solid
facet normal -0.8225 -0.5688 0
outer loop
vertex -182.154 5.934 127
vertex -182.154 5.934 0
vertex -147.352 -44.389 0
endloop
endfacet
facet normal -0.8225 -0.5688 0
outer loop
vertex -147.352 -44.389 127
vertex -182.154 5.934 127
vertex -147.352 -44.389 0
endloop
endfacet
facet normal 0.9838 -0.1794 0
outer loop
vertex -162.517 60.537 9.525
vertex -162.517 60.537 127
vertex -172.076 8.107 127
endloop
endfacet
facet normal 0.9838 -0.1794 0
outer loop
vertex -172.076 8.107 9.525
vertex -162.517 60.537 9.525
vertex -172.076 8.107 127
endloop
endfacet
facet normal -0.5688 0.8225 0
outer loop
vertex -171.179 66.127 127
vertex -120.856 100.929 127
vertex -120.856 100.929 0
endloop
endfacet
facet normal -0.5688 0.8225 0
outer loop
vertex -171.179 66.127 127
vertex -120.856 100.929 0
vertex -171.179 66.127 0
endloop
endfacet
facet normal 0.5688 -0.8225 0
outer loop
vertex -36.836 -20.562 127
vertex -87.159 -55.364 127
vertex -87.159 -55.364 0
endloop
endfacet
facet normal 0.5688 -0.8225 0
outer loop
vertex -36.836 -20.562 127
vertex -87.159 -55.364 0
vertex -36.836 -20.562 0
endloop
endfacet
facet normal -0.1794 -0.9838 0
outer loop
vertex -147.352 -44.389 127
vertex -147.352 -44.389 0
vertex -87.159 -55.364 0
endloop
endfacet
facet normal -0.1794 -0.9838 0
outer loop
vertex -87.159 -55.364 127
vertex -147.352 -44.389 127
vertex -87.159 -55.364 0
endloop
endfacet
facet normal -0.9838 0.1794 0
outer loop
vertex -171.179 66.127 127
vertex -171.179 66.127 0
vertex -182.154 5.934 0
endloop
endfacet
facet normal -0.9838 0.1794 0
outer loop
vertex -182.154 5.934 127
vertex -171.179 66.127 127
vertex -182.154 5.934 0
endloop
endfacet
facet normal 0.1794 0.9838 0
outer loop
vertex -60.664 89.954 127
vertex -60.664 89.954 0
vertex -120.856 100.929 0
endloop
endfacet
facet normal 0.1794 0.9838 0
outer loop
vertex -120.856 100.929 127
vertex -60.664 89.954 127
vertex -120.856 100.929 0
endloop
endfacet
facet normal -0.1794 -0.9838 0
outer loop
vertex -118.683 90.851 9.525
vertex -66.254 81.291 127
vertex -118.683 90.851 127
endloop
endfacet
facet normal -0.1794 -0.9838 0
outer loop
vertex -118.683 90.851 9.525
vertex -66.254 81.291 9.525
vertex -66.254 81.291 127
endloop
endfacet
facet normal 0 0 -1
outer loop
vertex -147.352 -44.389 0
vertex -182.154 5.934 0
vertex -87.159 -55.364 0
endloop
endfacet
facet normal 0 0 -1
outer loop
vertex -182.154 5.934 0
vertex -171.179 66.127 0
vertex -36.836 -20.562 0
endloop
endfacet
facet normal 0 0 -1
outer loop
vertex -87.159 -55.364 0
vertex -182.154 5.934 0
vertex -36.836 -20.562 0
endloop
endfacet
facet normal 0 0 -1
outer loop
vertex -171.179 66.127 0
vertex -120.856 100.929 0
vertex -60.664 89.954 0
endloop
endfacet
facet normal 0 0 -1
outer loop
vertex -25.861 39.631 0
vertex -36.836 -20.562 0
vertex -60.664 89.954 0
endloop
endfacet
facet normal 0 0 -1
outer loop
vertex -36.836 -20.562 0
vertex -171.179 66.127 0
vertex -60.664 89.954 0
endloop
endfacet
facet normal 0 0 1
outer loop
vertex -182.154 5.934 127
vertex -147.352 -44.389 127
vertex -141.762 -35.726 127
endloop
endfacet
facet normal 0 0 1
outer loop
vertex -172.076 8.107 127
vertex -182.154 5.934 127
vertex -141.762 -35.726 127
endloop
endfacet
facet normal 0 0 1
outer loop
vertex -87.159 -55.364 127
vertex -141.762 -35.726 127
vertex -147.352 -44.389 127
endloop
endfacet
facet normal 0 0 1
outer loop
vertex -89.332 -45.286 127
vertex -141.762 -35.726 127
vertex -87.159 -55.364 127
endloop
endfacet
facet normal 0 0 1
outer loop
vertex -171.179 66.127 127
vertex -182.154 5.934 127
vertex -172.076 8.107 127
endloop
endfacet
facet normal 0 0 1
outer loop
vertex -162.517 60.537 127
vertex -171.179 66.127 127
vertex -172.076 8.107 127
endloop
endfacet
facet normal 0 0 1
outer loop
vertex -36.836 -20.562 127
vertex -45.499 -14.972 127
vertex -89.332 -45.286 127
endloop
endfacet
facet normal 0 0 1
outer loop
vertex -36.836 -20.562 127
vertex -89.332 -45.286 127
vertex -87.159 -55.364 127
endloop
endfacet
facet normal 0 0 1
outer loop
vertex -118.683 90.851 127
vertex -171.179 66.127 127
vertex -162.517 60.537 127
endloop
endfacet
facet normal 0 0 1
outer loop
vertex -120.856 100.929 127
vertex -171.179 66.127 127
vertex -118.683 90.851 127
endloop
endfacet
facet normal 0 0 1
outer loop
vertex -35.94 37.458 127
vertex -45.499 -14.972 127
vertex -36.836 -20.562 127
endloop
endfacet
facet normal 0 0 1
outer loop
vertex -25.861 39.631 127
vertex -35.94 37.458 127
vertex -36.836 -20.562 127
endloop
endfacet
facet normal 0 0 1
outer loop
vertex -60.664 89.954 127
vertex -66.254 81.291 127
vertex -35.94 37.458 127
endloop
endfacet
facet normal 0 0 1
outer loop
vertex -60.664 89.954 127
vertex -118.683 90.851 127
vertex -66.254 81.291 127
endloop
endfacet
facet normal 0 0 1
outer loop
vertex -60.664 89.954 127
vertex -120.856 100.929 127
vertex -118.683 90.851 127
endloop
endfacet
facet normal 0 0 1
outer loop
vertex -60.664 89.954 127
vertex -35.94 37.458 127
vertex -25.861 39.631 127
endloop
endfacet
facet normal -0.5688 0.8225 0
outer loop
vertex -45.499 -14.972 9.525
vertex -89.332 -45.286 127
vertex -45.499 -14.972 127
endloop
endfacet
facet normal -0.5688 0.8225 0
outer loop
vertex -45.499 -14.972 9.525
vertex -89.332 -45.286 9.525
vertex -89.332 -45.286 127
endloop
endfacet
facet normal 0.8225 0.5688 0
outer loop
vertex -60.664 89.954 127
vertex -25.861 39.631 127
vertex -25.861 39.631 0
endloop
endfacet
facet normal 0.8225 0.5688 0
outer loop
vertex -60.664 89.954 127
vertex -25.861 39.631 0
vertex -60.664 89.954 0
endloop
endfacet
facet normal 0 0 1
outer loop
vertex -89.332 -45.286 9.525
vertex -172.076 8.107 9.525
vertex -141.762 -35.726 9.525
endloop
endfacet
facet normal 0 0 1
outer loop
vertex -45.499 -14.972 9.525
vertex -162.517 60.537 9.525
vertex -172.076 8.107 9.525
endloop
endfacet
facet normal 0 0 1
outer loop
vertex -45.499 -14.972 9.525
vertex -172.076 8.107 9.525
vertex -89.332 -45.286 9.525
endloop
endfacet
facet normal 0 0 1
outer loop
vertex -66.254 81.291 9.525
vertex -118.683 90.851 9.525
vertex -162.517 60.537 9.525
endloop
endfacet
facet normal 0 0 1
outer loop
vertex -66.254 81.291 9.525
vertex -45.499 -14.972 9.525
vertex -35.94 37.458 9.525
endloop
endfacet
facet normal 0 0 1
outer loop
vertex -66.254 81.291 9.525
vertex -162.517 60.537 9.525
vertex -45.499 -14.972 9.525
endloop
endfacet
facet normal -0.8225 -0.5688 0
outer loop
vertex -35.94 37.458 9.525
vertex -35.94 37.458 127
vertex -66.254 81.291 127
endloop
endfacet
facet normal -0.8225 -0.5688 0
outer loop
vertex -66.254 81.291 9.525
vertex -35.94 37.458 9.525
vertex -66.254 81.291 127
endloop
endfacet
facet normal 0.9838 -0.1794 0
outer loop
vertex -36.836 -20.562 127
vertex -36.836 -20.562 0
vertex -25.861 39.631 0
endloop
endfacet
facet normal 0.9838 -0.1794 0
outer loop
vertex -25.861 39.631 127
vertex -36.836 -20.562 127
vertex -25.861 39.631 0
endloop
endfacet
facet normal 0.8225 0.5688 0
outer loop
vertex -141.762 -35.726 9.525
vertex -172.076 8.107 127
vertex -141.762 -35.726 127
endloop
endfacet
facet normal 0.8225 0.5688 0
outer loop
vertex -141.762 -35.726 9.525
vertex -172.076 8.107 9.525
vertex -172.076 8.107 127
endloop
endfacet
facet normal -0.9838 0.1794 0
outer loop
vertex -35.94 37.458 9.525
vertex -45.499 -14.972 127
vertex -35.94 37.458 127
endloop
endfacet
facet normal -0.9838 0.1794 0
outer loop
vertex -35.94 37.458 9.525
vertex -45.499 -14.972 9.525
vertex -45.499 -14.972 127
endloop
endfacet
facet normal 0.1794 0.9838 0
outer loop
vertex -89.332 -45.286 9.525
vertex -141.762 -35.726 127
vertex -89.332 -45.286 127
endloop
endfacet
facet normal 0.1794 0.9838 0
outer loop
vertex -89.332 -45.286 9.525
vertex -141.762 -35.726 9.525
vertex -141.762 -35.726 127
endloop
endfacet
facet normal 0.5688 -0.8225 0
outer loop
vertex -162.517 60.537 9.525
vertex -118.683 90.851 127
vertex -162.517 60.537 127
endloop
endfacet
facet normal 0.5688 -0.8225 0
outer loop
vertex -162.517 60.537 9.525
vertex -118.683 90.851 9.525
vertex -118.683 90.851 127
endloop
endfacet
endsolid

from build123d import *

# Parameters (mm, degrees)
F1_DEPTH = 127
F2_T     = -9.525


# Not quite as in the source:
# - a length typed as a fraction of an inch, garbled in the dataset ("3 / 203.2 mm" for 3/8 in), is restored


with BuildPart() as f1:
    # F0 (on Top) → F1 (new body)
    with BuildSketch(Plane.XY):
        Polygon((-25.8614264401, 39.6310188183), (-60.6637008516, 89.9540535799), (-120.8563842186, 100.9288884727), (-171.1794189802, 66.1266140612), (-182.154253873, 5.9339306942), (-147.3519794615, -44.3891040675), (-87.1592960945, -55.3639389602), (-36.8362613329, -20.5616645487), align=None)
    extrude(amount=F1_DEPTH)

    # F2
    f2_openings = [f1.faces().sort_by_distance(p)[0] for p in [
        (-104.00784, 22.782475, 127),
    ]]
    offset(amount=F2_T, openings=f2_openings)


solid = f1.part
